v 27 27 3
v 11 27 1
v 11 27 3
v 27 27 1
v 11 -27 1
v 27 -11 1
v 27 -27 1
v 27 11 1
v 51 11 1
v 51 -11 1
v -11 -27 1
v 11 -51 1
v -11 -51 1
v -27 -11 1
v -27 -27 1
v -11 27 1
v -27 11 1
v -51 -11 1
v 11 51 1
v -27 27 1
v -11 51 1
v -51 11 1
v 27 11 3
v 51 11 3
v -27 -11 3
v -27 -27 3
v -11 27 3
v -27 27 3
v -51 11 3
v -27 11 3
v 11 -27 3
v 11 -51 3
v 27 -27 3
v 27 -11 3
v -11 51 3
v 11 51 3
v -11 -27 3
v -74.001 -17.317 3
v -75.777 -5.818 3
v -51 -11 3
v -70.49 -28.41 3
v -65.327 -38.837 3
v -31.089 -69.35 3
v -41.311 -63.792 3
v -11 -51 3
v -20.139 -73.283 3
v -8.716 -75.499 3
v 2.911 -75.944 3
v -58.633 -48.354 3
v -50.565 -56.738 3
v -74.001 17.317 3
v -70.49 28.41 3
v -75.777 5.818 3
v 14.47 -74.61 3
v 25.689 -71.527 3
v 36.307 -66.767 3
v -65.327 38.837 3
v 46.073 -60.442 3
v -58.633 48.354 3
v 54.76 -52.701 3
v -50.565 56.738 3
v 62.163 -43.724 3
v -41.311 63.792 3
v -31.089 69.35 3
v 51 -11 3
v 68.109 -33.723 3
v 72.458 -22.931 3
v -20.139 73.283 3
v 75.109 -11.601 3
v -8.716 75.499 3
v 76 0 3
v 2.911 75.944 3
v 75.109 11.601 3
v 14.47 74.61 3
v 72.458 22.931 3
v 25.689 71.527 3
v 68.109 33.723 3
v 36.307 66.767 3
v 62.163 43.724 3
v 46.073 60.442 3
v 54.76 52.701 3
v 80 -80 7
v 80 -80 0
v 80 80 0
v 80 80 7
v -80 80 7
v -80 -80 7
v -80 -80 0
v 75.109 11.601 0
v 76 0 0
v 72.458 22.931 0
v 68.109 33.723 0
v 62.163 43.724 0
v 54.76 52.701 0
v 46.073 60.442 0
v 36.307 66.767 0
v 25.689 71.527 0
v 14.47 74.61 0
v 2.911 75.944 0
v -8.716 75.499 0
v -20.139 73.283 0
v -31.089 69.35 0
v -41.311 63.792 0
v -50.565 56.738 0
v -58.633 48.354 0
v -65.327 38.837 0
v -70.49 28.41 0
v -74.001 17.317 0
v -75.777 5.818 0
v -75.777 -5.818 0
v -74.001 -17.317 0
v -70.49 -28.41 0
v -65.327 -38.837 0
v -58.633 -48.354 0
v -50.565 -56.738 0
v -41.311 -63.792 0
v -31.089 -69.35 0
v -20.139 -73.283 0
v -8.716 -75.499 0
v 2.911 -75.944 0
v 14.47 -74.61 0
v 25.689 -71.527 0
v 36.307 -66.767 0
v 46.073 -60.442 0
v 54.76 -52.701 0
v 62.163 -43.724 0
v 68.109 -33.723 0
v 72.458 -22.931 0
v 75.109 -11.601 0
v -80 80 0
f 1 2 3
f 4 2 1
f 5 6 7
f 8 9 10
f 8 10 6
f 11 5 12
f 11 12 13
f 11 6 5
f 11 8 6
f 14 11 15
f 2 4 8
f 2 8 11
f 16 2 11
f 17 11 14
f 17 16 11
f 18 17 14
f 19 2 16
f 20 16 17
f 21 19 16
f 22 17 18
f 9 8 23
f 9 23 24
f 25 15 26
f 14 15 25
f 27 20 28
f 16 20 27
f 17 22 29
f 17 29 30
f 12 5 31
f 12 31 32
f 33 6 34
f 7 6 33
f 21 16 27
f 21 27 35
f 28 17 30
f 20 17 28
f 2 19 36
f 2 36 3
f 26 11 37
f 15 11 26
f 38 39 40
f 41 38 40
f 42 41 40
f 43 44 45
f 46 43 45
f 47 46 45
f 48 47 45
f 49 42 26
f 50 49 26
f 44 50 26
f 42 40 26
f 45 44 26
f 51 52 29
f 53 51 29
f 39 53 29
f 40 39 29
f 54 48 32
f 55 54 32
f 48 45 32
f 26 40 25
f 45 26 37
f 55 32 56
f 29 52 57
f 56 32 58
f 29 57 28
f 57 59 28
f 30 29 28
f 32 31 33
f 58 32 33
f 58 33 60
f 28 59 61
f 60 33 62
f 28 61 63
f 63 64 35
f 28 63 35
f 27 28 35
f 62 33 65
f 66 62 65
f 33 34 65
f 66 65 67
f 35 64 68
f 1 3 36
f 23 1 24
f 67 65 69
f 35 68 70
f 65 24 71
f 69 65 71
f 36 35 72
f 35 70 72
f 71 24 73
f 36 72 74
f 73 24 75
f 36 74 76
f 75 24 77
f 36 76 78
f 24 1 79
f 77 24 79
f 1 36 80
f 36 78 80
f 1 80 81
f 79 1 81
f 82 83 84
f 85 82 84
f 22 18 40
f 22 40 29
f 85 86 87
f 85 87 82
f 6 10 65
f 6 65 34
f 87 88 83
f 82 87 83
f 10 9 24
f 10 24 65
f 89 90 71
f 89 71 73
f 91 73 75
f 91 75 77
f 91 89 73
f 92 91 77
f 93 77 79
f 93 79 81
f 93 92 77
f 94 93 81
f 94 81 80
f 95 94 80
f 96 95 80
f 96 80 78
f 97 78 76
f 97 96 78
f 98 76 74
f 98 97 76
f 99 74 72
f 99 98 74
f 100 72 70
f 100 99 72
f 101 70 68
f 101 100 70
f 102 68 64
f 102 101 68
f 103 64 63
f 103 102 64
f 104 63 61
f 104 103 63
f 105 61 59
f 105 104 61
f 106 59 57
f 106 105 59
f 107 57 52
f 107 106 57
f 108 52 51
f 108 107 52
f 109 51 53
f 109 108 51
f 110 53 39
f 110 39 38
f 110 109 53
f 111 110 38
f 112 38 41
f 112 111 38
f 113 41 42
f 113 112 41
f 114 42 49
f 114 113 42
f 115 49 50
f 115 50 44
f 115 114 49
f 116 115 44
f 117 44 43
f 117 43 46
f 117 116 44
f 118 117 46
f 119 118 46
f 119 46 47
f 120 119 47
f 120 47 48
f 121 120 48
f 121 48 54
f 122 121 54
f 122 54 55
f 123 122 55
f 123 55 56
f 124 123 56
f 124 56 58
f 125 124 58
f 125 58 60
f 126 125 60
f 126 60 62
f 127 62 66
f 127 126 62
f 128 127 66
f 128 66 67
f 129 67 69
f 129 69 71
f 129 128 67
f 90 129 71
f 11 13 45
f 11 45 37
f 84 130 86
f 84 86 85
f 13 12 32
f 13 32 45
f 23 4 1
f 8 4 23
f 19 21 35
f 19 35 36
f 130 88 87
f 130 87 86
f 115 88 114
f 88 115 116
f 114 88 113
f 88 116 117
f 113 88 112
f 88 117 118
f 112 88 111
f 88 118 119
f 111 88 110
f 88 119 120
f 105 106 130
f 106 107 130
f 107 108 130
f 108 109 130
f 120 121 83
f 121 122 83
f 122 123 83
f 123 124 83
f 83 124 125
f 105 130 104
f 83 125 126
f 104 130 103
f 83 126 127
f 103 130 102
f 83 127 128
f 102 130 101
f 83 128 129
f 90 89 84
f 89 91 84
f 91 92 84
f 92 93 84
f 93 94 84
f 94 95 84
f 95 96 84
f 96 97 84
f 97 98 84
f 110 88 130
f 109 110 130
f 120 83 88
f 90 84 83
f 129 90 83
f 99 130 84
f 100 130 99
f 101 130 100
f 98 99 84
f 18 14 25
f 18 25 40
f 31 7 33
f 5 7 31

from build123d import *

# Parameters (mm, degrees)
SKICA1_W                 = 160
SKICA1_H                 = 160
P_IDAT_VYSUNUT_M1_DEPTH  = 7
ODEBRAT_VYSUNUT_M1_DEPTH = 1
SKICA1_6_R               = 76
ODEBRAT_VYSUNUT_M3_DEPTH = 3


with BuildPart() as part:
    # Skica1 → Přidat vysunutím1 (new body)
    with BuildSketch(Plane.XY):
        Rectangle(SKICA1_W, SKICA1_H)
    extrude(amount=P_IDAT_VYSUNUT_M1_DEPTH)

    # Skica1<5> → Odebrat vysunutím1 (cut)
    with BuildSketch(Plane.XY):
        Polygon((11, 27), (11, 51), (-11, 51), (-11, 27), (-27, 27), (-27, 11), (-51, 11), (-51, -11), (-27, -11), (-27, -27), (-11, -27), (-11, -51), (11, -51), (11, -27), (27, -27), (27, -11), (51, -11), (51, 11), (27, 11), (27, 27), align=None)
    extrude(amount=ODEBRAT_VYSUNUT_M1_DEPTH, mode=Mode.SUBTRACT)

    # Skica1<6> → Odebrat vysunutím3 (cut)
    with BuildSketch(Plane.XY):
        Circle(SKICA1_6_R)
        Polygon((-11, 51), (11, 51), (11, 27), (27, 27), (27, 11), (51, 11), (51, -11), (27, -11), (27, -27), (11, -27), (11, -51), (-11, -51), (-11, -27), (-27, -27), (-27, -11), (-51, -11), (-51, 11), (-27, 11), (-27, 27), (-11, 27), align=None, mode=Mode.SUBTRACT)
    extrude(amount=ODEBRAT_VYSUNUT_M3_DEPTH, mode=Mode.SUBTRACT)


solid = part.part
